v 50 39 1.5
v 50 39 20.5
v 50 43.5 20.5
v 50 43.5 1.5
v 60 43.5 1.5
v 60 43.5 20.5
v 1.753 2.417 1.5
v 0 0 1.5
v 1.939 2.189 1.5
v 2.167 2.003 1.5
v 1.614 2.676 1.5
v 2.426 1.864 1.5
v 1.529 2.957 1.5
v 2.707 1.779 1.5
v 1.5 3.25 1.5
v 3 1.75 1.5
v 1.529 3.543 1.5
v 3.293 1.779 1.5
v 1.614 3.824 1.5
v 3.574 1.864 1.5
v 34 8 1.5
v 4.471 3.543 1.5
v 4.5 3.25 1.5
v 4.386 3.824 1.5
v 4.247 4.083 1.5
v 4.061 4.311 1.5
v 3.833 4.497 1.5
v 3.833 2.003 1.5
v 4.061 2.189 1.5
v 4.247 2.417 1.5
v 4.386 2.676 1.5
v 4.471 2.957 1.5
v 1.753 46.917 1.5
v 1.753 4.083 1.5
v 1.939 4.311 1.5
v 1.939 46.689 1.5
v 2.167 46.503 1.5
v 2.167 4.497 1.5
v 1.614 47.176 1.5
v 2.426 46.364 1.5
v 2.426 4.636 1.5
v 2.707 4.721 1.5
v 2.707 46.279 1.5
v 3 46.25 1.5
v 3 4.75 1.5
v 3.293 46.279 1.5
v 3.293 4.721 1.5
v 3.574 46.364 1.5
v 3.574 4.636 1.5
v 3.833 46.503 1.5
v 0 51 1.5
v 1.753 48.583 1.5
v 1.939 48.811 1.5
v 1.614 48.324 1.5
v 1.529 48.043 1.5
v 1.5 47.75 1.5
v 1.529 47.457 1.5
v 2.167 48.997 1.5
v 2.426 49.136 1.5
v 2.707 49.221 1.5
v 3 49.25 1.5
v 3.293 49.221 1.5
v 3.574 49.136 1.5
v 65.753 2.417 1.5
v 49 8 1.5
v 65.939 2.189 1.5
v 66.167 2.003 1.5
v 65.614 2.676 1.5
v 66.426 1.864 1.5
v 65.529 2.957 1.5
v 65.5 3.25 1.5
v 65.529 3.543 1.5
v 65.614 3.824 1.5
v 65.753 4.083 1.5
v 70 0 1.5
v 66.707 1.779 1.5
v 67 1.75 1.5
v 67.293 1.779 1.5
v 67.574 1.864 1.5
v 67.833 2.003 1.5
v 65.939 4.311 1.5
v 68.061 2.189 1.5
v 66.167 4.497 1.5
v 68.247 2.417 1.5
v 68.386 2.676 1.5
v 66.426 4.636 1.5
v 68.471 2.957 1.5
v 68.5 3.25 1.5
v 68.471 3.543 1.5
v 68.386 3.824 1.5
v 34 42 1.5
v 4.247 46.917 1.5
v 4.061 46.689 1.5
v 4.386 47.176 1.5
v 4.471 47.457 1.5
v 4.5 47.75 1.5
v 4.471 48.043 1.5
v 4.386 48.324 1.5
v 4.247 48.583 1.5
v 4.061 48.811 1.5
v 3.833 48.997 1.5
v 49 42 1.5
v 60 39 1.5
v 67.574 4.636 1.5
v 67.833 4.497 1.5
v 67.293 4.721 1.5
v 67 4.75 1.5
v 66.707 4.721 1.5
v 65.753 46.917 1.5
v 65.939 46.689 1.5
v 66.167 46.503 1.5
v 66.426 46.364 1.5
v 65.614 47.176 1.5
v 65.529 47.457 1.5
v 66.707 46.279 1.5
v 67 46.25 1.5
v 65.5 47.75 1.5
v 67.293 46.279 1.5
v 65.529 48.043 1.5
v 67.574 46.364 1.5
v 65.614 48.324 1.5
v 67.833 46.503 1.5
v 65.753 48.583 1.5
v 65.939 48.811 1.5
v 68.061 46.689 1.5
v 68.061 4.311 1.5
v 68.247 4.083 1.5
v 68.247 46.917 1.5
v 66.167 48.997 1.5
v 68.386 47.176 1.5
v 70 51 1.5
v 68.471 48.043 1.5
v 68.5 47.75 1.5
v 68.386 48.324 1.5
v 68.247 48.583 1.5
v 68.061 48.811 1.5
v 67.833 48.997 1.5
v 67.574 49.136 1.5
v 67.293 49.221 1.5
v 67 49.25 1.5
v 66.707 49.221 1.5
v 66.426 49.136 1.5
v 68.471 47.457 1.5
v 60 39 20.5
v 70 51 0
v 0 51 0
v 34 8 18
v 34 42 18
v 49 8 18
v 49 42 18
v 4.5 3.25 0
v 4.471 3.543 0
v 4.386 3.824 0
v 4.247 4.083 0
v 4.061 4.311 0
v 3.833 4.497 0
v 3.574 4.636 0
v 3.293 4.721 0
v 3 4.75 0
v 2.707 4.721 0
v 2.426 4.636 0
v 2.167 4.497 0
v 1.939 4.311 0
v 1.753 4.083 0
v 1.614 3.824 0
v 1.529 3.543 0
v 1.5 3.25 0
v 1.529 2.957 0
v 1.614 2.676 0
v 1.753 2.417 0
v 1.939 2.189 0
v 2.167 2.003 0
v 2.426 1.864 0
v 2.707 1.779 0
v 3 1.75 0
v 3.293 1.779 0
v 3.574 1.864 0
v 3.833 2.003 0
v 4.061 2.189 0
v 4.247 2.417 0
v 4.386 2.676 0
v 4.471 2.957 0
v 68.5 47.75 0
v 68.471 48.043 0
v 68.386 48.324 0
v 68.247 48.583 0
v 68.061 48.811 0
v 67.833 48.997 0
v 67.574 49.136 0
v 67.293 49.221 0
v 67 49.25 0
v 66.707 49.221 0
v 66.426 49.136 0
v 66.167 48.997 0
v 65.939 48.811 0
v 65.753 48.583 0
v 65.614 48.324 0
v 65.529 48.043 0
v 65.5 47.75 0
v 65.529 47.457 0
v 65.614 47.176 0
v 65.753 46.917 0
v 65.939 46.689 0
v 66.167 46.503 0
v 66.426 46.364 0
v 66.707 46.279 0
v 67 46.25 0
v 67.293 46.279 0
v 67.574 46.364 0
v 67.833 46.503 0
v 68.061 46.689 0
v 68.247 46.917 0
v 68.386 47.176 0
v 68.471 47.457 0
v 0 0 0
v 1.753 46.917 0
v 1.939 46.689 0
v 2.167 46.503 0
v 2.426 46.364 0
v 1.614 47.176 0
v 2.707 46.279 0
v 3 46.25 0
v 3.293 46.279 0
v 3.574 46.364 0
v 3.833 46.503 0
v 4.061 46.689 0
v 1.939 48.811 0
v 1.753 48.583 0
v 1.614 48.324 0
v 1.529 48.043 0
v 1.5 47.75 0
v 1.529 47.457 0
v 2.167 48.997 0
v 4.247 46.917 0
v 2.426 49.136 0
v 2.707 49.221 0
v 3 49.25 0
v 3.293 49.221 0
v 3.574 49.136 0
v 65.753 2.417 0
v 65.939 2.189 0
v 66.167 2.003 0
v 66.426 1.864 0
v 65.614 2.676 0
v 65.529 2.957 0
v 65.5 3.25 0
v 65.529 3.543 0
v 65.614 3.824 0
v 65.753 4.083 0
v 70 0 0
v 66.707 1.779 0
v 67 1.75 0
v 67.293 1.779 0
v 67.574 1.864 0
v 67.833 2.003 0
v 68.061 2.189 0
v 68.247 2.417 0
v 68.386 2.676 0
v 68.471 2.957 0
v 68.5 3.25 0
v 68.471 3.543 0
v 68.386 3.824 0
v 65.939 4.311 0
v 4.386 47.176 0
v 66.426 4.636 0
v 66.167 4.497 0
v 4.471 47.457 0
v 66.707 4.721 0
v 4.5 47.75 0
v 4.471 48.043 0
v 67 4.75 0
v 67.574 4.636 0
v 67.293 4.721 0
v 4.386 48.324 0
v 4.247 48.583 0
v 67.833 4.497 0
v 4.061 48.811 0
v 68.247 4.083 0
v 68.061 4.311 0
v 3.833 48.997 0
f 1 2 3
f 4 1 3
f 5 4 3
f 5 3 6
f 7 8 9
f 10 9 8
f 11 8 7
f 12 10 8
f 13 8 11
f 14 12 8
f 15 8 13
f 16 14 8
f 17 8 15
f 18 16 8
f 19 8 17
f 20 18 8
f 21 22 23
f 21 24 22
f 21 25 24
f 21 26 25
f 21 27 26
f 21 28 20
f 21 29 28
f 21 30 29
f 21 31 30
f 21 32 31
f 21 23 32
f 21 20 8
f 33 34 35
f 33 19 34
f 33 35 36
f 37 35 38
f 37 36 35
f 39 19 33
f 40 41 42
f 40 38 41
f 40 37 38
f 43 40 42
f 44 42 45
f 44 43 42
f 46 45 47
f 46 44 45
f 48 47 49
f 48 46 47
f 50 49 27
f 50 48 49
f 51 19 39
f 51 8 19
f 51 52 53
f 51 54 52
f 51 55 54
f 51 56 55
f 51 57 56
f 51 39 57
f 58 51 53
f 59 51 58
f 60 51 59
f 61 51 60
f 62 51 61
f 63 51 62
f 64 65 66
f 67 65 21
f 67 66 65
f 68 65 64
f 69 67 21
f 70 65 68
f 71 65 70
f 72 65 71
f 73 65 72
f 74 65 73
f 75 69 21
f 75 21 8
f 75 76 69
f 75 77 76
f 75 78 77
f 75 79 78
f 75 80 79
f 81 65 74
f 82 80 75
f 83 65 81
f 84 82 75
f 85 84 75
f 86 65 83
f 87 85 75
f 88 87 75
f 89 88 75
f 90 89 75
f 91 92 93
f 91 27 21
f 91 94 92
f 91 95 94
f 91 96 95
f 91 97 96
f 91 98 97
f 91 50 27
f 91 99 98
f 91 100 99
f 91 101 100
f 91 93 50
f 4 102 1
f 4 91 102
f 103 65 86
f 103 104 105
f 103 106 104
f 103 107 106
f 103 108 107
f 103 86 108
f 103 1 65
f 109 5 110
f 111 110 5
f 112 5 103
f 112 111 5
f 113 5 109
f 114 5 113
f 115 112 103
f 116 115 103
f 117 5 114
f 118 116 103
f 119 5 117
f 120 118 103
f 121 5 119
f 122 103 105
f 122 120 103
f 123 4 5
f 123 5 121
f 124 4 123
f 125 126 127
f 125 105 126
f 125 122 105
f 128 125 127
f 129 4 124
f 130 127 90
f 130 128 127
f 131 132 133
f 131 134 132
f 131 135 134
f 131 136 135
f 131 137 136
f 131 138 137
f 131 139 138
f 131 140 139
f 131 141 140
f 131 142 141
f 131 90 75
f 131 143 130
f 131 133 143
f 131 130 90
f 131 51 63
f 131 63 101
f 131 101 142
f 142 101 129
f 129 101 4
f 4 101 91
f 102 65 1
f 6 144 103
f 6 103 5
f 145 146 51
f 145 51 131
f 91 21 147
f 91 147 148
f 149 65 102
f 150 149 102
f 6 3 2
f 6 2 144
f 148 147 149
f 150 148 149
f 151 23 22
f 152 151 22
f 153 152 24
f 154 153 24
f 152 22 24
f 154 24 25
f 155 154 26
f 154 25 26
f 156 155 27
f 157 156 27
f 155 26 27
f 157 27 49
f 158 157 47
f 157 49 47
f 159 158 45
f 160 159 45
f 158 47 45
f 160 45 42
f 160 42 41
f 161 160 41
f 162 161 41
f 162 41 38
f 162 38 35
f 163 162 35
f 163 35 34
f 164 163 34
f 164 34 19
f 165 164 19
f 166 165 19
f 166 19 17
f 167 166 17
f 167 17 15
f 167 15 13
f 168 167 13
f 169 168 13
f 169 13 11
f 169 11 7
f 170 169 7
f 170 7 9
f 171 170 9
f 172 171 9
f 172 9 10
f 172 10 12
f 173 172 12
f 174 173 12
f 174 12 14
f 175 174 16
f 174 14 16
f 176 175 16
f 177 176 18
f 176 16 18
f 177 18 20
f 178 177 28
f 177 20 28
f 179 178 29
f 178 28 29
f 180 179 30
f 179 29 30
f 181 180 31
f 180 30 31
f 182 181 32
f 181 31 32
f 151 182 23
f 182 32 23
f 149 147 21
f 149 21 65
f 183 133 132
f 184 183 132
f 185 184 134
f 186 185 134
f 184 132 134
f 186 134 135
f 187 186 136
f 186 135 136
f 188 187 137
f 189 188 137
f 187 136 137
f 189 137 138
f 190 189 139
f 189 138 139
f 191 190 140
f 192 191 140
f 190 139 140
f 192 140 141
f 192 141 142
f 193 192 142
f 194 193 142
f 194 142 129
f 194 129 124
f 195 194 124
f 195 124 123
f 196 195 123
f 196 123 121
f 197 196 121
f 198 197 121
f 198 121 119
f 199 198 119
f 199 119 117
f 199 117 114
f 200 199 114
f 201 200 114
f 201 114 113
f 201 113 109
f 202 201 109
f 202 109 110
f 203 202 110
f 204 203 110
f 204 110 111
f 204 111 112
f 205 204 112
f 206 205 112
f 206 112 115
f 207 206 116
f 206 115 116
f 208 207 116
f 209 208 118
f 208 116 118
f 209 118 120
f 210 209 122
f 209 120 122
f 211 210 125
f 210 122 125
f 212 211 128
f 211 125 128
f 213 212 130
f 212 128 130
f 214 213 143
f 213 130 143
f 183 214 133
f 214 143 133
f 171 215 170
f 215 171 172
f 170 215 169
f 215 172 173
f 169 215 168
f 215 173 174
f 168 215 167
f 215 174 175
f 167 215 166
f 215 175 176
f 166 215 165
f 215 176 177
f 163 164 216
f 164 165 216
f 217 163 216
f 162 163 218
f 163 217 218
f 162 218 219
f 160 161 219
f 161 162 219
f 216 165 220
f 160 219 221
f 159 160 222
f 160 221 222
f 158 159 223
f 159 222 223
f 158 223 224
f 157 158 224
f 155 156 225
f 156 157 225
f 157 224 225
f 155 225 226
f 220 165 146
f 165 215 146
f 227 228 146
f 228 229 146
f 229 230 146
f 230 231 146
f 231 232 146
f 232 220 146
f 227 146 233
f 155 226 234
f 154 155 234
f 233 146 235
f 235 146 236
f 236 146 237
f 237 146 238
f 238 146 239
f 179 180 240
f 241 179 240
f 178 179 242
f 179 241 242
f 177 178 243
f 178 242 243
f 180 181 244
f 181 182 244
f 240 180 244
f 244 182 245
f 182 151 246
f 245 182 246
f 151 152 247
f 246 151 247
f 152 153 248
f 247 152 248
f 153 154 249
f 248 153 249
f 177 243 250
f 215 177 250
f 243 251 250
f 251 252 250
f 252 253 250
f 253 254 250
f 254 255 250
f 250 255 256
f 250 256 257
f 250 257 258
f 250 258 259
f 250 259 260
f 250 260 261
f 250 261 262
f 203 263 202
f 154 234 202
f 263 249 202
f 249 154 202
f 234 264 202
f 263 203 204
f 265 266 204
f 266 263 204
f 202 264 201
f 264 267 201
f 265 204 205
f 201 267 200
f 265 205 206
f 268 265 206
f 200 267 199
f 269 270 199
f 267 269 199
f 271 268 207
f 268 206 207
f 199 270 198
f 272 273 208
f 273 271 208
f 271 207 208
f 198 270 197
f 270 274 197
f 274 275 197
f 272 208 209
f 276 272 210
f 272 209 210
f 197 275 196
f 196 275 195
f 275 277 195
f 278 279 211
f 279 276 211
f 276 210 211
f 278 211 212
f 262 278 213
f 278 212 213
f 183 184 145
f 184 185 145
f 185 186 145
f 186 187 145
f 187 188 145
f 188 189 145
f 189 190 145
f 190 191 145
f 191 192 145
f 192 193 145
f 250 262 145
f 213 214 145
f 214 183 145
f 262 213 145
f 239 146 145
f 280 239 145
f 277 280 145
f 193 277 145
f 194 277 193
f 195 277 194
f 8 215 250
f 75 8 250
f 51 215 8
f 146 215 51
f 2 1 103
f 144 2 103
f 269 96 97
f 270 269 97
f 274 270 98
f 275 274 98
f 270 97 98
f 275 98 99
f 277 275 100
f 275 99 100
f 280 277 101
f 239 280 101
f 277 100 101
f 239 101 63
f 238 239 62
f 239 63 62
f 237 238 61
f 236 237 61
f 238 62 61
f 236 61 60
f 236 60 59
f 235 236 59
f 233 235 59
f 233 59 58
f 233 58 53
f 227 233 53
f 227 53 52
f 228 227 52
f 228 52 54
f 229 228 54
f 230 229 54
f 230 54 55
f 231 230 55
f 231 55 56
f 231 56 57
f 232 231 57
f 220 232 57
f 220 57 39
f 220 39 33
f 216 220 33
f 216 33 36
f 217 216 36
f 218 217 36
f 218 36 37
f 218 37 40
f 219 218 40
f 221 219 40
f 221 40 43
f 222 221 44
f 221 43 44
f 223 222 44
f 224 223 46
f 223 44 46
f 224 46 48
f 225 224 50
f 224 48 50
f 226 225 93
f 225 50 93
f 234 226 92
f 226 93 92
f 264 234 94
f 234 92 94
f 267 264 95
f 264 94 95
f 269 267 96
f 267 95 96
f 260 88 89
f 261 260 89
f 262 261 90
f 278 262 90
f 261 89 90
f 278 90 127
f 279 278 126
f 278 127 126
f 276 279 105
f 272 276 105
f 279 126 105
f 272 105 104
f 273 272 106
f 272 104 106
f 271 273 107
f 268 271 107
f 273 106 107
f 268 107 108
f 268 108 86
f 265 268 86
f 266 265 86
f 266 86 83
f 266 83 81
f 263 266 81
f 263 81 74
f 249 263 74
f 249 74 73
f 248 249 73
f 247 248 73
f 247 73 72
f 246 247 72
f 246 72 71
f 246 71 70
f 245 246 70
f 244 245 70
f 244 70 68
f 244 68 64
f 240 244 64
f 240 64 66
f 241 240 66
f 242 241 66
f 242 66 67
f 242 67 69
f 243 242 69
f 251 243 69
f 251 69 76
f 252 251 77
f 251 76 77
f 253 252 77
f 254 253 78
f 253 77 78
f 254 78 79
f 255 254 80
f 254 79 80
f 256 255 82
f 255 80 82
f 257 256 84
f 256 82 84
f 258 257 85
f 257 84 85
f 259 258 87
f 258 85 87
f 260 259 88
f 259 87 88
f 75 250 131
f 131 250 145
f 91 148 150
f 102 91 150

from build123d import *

# Parameters (mm, degrees)
F0_W     = 70
F0_H     = 51
F1_DEPTH = 1.5
F2_R     = 1.5
F3_DEPTH = 1.501
F4_W     = 15
F4_H     = 34
F5_DEPTH = 16.5
F6_W     = 10
F6_H     = 4.5
F7_DEPTH = 19


with BuildPart() as f1:
    # F0 (on Top) → F1 (new body)
    with BuildSketch(Plane.XY):
        with Locations((35, 25.5)):
            Rectangle(F0_W, F0_H)
    extrude(amount=F1_DEPTH)

    # F2 (on face) → F3 (cut, through all)
    with BuildSketch(Plane.XY.offset(1.5)):
        with Locations((67, 47.75)):
            Circle(F2_R)
        with Locations((67, 3.25)):
            Circle(F2_R)
        with Locations((3, 47.75)):
            Circle(F2_R)
        with Locations((3, 3.25)):
            Circle(F2_R)
    extrude(amount=-F3_DEPTH, mode=Mode.SUBTRACT)

    # F4 (on face) → F5 (join)
    with BuildSketch(Plane.XY.offset(1.5)):
        with Locations((41.5, 25)):
            Rectangle(F4_W, F4_H)
    extrude(amount=F5_DEPTH)

    # F6 (on face) → F7 (join)
    with BuildSketch(Plane.XY.offset(1.5)):
        with Locations((55, 41.25)):
            Rectangle(F6_W, F6_H)
    extrude(amount=F7_DEPTH)


solid = f1.part
